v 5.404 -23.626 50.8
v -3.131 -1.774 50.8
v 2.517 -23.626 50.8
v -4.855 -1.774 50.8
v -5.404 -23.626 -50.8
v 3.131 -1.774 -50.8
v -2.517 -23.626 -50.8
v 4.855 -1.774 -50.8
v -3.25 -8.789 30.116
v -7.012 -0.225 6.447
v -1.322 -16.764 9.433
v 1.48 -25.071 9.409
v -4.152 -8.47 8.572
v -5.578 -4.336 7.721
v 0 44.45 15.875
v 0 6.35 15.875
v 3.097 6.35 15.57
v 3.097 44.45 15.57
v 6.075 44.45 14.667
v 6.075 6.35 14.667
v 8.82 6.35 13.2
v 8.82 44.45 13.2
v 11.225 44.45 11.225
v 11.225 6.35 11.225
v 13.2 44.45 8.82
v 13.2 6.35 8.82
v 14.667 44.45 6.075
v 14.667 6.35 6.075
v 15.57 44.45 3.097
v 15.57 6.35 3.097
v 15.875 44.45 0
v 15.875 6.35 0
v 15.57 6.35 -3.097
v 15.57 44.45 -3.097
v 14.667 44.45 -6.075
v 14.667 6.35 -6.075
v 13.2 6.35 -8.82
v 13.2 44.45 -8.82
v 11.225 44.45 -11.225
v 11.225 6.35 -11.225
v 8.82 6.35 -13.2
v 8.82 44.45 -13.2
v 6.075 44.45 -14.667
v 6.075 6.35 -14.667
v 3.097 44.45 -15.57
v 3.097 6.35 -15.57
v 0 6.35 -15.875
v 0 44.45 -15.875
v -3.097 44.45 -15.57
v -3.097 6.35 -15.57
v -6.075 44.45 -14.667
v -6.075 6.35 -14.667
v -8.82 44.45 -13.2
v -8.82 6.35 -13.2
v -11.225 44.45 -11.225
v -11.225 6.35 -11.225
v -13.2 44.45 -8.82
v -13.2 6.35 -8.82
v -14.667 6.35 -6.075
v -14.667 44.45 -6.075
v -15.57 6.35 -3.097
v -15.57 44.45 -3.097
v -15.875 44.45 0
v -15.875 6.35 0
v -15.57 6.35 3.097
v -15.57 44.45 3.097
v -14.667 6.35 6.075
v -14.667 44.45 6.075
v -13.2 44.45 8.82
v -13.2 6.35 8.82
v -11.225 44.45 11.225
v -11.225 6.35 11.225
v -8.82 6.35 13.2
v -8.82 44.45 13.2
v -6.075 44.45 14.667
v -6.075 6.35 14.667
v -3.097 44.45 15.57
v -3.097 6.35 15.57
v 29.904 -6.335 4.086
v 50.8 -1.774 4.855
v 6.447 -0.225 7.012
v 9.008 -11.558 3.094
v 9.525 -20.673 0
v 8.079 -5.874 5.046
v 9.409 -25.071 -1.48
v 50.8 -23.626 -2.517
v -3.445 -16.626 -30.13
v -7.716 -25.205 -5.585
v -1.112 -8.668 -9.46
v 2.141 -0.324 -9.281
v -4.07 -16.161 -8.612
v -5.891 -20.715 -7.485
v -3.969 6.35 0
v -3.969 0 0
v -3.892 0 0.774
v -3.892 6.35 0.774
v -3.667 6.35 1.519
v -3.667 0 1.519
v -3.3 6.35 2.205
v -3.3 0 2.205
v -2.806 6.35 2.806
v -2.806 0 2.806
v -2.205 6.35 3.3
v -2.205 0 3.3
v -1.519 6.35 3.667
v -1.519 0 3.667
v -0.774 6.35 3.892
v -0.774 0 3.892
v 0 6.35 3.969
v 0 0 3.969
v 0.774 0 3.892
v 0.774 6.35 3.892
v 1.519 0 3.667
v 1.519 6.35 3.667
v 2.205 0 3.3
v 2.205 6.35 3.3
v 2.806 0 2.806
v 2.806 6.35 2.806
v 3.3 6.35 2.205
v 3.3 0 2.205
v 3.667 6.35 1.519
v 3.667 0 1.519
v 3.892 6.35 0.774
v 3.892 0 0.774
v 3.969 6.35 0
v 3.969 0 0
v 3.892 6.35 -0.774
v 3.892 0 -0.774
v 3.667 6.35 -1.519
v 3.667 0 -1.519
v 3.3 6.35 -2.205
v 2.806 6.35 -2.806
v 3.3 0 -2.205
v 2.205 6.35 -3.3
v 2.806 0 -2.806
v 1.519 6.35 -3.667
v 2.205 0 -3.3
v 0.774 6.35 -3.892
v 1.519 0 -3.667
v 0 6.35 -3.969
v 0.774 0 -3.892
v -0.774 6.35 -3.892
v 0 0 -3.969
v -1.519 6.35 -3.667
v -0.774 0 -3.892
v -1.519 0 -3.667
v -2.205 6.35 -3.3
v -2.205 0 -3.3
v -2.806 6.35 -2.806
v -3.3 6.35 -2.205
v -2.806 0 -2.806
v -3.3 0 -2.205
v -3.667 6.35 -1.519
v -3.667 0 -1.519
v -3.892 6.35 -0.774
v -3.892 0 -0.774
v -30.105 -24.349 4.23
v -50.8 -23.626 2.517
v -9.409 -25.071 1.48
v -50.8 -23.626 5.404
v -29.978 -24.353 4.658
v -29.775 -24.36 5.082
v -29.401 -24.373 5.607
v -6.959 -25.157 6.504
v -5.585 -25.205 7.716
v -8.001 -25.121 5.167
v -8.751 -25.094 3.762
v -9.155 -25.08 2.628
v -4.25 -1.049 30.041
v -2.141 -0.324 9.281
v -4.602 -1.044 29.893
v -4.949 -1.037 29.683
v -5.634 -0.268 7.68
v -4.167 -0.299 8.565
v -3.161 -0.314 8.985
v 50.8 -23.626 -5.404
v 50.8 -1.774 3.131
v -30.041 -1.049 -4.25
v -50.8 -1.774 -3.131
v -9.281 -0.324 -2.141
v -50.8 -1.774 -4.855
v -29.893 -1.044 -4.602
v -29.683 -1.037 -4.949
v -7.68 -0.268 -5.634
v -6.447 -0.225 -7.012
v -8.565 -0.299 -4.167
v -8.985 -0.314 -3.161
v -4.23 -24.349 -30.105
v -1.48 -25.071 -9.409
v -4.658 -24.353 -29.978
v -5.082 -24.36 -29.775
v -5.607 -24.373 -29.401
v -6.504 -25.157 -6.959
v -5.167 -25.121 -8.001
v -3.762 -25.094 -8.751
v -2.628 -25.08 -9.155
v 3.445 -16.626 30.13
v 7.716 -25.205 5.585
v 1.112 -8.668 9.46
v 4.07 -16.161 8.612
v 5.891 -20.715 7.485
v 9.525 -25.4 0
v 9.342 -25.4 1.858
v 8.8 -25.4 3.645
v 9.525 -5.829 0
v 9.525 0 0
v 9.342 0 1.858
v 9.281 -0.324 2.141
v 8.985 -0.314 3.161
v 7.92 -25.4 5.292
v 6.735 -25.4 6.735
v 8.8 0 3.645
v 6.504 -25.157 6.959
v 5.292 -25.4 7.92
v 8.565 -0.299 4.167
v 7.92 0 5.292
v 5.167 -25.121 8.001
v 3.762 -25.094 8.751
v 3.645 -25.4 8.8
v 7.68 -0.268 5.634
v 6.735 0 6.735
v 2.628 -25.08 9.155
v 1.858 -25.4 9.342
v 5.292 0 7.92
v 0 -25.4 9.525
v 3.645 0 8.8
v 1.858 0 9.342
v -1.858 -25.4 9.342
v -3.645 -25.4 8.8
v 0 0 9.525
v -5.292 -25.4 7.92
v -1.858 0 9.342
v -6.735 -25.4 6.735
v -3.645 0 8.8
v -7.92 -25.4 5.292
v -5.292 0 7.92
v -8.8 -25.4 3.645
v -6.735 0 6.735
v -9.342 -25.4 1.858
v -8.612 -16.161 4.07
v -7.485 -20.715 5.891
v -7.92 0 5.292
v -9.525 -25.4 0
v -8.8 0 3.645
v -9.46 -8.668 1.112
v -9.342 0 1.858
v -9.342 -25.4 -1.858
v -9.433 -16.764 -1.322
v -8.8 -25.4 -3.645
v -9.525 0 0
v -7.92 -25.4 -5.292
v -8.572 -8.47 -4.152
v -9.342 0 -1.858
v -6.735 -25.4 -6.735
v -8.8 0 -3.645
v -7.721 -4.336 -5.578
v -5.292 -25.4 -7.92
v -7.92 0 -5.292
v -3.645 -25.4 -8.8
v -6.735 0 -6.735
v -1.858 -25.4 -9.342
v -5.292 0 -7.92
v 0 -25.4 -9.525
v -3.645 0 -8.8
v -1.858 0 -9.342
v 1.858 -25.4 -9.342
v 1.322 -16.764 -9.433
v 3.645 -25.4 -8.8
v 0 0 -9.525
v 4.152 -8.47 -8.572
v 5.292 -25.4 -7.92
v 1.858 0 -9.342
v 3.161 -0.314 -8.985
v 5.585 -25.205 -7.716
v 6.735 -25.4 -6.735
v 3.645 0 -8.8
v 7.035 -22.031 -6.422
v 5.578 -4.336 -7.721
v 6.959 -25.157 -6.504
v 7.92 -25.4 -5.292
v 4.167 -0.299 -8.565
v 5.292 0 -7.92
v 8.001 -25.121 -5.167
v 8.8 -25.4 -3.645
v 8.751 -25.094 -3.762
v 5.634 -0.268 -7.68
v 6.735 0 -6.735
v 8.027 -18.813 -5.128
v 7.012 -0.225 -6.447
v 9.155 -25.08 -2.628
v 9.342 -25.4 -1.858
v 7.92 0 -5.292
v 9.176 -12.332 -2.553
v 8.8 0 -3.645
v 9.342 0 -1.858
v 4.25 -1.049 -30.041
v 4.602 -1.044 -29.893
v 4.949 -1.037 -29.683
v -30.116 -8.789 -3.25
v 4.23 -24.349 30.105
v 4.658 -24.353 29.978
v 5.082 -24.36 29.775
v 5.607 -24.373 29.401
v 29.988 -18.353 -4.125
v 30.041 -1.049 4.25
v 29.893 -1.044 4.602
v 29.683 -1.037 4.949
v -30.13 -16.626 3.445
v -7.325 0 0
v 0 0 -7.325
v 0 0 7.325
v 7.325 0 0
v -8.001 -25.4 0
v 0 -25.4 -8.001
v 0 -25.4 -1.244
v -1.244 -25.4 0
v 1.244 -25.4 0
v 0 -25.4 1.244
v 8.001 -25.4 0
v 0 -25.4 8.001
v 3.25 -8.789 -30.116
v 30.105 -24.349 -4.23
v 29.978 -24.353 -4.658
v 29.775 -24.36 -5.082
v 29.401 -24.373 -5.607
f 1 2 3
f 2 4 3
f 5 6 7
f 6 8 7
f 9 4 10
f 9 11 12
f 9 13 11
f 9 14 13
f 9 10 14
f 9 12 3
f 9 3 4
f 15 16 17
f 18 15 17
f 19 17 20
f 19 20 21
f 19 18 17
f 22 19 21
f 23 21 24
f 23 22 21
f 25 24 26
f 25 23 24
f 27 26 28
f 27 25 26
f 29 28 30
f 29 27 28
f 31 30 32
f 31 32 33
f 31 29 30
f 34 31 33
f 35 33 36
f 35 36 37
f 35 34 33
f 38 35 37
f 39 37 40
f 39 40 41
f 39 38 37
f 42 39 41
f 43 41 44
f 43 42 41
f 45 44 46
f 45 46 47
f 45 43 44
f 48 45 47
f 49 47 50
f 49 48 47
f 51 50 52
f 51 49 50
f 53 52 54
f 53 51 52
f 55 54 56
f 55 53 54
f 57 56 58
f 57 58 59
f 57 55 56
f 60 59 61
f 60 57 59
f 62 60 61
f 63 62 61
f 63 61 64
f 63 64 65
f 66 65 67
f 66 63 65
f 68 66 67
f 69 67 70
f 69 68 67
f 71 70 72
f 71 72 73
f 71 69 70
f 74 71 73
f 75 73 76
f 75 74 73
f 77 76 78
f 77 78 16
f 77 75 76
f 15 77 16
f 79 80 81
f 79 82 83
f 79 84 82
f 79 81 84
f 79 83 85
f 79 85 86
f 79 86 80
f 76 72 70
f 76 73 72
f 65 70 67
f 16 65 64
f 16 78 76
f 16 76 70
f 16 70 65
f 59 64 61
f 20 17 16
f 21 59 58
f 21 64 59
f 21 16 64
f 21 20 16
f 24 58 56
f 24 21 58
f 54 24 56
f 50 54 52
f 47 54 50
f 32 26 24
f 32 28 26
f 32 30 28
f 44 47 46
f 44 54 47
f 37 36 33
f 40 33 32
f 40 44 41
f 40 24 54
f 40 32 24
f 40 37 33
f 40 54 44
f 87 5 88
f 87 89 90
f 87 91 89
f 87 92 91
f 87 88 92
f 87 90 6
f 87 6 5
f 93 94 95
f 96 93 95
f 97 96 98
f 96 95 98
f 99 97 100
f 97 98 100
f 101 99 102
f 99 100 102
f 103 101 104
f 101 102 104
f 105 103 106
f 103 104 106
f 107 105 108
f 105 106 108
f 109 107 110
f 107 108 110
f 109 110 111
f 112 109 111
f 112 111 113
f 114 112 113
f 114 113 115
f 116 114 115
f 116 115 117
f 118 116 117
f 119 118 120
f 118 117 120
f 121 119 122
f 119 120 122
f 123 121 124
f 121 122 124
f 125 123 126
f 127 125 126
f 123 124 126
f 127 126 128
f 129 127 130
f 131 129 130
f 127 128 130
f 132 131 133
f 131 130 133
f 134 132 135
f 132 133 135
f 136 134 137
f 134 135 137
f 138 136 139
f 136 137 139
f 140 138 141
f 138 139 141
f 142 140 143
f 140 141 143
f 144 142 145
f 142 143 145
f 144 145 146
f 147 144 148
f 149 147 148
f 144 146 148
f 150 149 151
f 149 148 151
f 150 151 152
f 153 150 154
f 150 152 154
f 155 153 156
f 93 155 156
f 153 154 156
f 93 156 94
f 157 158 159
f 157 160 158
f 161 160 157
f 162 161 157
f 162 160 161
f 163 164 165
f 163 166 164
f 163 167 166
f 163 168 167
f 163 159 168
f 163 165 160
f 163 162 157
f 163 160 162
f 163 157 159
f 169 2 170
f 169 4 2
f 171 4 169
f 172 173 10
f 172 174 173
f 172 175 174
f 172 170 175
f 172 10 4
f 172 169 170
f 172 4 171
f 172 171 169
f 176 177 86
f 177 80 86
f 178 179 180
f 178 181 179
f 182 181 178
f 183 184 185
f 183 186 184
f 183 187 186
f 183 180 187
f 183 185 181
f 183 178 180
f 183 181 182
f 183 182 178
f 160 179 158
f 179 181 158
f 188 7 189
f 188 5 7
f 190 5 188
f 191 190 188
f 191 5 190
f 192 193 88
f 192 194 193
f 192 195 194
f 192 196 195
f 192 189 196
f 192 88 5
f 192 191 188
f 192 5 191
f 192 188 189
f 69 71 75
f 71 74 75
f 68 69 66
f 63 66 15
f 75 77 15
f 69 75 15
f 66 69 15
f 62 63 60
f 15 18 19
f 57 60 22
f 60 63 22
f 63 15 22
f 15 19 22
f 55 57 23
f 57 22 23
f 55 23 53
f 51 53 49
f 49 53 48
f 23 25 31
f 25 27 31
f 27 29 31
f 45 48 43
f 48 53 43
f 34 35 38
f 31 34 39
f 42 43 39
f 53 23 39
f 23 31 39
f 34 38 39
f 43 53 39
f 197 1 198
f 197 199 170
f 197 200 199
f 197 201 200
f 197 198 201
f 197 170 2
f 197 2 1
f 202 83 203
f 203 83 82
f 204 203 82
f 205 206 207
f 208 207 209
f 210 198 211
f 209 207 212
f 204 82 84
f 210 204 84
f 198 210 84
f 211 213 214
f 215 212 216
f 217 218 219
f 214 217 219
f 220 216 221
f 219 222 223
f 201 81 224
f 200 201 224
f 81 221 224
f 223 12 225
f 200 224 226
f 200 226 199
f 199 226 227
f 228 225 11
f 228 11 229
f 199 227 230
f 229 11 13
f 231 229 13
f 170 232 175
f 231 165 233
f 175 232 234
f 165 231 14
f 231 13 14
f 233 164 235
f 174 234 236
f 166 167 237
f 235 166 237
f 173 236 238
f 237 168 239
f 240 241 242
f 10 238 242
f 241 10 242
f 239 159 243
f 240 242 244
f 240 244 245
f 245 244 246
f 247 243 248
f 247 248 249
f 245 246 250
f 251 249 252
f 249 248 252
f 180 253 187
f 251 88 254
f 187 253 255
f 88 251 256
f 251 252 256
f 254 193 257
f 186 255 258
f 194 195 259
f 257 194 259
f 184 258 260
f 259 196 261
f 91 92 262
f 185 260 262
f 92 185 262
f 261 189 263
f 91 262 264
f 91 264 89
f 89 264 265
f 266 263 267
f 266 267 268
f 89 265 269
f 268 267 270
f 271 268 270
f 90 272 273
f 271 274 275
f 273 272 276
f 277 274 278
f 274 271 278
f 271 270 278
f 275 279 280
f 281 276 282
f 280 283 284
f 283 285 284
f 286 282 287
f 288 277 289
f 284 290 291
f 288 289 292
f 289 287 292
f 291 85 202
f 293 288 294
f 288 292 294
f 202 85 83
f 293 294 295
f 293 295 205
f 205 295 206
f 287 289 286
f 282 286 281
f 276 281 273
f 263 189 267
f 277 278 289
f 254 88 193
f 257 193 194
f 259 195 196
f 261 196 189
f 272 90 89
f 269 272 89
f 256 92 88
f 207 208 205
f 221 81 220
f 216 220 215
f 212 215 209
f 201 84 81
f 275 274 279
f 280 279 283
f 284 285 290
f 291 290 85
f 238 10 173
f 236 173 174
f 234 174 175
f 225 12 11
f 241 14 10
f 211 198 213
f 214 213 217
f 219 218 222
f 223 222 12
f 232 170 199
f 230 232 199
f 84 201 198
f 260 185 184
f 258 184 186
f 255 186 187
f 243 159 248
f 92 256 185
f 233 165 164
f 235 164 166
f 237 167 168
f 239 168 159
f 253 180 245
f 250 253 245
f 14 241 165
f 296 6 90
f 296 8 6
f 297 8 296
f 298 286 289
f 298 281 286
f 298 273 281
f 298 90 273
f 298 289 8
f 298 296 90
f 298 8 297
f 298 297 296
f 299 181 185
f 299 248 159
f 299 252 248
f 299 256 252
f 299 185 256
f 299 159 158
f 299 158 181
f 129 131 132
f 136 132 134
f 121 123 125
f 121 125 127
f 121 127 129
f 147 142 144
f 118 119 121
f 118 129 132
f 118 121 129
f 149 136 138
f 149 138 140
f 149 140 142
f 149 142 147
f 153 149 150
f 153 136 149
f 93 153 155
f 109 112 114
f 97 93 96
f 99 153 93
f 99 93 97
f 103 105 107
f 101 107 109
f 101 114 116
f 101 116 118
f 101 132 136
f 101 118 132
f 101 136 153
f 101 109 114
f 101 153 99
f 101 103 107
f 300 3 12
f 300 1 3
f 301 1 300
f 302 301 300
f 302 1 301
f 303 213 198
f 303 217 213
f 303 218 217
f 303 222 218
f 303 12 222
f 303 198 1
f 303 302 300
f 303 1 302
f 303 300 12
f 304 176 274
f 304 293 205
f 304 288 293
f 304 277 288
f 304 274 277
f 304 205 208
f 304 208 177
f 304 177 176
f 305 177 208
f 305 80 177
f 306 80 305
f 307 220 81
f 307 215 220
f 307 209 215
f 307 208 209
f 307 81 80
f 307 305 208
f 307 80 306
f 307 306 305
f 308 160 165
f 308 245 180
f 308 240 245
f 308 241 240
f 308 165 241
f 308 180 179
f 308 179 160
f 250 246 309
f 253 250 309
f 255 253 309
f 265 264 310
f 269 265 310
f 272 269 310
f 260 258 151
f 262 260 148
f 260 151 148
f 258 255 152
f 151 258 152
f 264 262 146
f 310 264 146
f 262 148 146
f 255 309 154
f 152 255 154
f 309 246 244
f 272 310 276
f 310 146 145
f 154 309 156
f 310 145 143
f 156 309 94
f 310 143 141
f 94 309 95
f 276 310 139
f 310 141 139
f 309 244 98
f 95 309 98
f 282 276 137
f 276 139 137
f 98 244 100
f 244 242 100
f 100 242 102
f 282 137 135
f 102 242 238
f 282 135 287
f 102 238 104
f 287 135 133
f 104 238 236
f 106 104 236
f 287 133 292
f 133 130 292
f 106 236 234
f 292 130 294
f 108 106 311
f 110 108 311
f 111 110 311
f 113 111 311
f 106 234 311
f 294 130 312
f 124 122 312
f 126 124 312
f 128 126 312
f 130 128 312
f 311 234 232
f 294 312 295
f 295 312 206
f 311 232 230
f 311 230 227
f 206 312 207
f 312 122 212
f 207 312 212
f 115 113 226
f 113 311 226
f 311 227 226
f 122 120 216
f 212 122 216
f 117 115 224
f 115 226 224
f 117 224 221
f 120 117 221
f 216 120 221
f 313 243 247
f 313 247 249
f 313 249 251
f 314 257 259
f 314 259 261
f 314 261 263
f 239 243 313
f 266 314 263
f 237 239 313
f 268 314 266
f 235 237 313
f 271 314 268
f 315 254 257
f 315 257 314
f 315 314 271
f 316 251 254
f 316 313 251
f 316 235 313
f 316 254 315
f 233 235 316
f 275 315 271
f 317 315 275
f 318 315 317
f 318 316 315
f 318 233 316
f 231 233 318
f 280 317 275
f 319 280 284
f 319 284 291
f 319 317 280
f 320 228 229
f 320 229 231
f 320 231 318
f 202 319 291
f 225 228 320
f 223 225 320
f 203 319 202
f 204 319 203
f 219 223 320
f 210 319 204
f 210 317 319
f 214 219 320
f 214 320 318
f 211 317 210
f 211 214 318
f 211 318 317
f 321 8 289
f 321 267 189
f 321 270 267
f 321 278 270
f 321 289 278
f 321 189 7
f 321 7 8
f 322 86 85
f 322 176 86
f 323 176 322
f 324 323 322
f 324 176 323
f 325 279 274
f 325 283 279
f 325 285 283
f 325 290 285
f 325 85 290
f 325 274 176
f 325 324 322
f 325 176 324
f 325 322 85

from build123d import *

# Parameters (mm, degrees)
F0_R     = 9.525
F1_DEPTH = 25.4
F3_DEPTH = 50.8
F3_TAPER = 2
F5_COUNT = 4
F6_R     = 3.96875
F7_DEPTH = 6.35
F8_W     = 38.1
F8_H     = 15.875


with BuildPart() as f1:
    # F0 (on Front) → F1 (new body)
    with BuildSketch(Plane.XZ):
        Circle(F0_R)
    extrude(amount=F1_DEPTH)



with BuildPart() as f3:
    # F2 (on Right) → F3 (new body)
    with BuildSketch(Plane.YZ):
        Polygon((0, 1.9194104331), (0, 7.3254335173), (-25.4, -1.2436575476), (-25.4, -8.0011864028), align=None)
    extrude(amount=F3_DEPTH, taper=F3_TAPER)


with BuildPart() as f1_1:
    add(f1.part)

    add(f3.part)  # F5 merges F3
    # F5: F3 ×4 about axis
    f5_axis = Axis((0, -12.7, 0), (0, 1, 0))
    for i in range(1, F5_COUNT):
        add(f3.part.rotate(f5_axis, i * 360 / F5_COUNT))

    # F6 (on face) → F7 (join)
    with BuildSketch(Plane(origin=(0, 0, 0), x_dir=(-1, 0, 0), z_dir=(0, 1, 0))):
        Circle(F6_R)
    extrude(amount=F7_DEPTH)


with BuildPart() as f9:
    # F8 (on Right) → F9 (revolve)
    with BuildSketch(Plane.YZ):
        with Locations((25.4, 7.9375)):
            Rectangle(F8_W, F8_H)
    revolve(axis=Axis((0, 25.4, 0), (0, 1, 0)))


solid = Compound([f1_1.part, f9.part])
